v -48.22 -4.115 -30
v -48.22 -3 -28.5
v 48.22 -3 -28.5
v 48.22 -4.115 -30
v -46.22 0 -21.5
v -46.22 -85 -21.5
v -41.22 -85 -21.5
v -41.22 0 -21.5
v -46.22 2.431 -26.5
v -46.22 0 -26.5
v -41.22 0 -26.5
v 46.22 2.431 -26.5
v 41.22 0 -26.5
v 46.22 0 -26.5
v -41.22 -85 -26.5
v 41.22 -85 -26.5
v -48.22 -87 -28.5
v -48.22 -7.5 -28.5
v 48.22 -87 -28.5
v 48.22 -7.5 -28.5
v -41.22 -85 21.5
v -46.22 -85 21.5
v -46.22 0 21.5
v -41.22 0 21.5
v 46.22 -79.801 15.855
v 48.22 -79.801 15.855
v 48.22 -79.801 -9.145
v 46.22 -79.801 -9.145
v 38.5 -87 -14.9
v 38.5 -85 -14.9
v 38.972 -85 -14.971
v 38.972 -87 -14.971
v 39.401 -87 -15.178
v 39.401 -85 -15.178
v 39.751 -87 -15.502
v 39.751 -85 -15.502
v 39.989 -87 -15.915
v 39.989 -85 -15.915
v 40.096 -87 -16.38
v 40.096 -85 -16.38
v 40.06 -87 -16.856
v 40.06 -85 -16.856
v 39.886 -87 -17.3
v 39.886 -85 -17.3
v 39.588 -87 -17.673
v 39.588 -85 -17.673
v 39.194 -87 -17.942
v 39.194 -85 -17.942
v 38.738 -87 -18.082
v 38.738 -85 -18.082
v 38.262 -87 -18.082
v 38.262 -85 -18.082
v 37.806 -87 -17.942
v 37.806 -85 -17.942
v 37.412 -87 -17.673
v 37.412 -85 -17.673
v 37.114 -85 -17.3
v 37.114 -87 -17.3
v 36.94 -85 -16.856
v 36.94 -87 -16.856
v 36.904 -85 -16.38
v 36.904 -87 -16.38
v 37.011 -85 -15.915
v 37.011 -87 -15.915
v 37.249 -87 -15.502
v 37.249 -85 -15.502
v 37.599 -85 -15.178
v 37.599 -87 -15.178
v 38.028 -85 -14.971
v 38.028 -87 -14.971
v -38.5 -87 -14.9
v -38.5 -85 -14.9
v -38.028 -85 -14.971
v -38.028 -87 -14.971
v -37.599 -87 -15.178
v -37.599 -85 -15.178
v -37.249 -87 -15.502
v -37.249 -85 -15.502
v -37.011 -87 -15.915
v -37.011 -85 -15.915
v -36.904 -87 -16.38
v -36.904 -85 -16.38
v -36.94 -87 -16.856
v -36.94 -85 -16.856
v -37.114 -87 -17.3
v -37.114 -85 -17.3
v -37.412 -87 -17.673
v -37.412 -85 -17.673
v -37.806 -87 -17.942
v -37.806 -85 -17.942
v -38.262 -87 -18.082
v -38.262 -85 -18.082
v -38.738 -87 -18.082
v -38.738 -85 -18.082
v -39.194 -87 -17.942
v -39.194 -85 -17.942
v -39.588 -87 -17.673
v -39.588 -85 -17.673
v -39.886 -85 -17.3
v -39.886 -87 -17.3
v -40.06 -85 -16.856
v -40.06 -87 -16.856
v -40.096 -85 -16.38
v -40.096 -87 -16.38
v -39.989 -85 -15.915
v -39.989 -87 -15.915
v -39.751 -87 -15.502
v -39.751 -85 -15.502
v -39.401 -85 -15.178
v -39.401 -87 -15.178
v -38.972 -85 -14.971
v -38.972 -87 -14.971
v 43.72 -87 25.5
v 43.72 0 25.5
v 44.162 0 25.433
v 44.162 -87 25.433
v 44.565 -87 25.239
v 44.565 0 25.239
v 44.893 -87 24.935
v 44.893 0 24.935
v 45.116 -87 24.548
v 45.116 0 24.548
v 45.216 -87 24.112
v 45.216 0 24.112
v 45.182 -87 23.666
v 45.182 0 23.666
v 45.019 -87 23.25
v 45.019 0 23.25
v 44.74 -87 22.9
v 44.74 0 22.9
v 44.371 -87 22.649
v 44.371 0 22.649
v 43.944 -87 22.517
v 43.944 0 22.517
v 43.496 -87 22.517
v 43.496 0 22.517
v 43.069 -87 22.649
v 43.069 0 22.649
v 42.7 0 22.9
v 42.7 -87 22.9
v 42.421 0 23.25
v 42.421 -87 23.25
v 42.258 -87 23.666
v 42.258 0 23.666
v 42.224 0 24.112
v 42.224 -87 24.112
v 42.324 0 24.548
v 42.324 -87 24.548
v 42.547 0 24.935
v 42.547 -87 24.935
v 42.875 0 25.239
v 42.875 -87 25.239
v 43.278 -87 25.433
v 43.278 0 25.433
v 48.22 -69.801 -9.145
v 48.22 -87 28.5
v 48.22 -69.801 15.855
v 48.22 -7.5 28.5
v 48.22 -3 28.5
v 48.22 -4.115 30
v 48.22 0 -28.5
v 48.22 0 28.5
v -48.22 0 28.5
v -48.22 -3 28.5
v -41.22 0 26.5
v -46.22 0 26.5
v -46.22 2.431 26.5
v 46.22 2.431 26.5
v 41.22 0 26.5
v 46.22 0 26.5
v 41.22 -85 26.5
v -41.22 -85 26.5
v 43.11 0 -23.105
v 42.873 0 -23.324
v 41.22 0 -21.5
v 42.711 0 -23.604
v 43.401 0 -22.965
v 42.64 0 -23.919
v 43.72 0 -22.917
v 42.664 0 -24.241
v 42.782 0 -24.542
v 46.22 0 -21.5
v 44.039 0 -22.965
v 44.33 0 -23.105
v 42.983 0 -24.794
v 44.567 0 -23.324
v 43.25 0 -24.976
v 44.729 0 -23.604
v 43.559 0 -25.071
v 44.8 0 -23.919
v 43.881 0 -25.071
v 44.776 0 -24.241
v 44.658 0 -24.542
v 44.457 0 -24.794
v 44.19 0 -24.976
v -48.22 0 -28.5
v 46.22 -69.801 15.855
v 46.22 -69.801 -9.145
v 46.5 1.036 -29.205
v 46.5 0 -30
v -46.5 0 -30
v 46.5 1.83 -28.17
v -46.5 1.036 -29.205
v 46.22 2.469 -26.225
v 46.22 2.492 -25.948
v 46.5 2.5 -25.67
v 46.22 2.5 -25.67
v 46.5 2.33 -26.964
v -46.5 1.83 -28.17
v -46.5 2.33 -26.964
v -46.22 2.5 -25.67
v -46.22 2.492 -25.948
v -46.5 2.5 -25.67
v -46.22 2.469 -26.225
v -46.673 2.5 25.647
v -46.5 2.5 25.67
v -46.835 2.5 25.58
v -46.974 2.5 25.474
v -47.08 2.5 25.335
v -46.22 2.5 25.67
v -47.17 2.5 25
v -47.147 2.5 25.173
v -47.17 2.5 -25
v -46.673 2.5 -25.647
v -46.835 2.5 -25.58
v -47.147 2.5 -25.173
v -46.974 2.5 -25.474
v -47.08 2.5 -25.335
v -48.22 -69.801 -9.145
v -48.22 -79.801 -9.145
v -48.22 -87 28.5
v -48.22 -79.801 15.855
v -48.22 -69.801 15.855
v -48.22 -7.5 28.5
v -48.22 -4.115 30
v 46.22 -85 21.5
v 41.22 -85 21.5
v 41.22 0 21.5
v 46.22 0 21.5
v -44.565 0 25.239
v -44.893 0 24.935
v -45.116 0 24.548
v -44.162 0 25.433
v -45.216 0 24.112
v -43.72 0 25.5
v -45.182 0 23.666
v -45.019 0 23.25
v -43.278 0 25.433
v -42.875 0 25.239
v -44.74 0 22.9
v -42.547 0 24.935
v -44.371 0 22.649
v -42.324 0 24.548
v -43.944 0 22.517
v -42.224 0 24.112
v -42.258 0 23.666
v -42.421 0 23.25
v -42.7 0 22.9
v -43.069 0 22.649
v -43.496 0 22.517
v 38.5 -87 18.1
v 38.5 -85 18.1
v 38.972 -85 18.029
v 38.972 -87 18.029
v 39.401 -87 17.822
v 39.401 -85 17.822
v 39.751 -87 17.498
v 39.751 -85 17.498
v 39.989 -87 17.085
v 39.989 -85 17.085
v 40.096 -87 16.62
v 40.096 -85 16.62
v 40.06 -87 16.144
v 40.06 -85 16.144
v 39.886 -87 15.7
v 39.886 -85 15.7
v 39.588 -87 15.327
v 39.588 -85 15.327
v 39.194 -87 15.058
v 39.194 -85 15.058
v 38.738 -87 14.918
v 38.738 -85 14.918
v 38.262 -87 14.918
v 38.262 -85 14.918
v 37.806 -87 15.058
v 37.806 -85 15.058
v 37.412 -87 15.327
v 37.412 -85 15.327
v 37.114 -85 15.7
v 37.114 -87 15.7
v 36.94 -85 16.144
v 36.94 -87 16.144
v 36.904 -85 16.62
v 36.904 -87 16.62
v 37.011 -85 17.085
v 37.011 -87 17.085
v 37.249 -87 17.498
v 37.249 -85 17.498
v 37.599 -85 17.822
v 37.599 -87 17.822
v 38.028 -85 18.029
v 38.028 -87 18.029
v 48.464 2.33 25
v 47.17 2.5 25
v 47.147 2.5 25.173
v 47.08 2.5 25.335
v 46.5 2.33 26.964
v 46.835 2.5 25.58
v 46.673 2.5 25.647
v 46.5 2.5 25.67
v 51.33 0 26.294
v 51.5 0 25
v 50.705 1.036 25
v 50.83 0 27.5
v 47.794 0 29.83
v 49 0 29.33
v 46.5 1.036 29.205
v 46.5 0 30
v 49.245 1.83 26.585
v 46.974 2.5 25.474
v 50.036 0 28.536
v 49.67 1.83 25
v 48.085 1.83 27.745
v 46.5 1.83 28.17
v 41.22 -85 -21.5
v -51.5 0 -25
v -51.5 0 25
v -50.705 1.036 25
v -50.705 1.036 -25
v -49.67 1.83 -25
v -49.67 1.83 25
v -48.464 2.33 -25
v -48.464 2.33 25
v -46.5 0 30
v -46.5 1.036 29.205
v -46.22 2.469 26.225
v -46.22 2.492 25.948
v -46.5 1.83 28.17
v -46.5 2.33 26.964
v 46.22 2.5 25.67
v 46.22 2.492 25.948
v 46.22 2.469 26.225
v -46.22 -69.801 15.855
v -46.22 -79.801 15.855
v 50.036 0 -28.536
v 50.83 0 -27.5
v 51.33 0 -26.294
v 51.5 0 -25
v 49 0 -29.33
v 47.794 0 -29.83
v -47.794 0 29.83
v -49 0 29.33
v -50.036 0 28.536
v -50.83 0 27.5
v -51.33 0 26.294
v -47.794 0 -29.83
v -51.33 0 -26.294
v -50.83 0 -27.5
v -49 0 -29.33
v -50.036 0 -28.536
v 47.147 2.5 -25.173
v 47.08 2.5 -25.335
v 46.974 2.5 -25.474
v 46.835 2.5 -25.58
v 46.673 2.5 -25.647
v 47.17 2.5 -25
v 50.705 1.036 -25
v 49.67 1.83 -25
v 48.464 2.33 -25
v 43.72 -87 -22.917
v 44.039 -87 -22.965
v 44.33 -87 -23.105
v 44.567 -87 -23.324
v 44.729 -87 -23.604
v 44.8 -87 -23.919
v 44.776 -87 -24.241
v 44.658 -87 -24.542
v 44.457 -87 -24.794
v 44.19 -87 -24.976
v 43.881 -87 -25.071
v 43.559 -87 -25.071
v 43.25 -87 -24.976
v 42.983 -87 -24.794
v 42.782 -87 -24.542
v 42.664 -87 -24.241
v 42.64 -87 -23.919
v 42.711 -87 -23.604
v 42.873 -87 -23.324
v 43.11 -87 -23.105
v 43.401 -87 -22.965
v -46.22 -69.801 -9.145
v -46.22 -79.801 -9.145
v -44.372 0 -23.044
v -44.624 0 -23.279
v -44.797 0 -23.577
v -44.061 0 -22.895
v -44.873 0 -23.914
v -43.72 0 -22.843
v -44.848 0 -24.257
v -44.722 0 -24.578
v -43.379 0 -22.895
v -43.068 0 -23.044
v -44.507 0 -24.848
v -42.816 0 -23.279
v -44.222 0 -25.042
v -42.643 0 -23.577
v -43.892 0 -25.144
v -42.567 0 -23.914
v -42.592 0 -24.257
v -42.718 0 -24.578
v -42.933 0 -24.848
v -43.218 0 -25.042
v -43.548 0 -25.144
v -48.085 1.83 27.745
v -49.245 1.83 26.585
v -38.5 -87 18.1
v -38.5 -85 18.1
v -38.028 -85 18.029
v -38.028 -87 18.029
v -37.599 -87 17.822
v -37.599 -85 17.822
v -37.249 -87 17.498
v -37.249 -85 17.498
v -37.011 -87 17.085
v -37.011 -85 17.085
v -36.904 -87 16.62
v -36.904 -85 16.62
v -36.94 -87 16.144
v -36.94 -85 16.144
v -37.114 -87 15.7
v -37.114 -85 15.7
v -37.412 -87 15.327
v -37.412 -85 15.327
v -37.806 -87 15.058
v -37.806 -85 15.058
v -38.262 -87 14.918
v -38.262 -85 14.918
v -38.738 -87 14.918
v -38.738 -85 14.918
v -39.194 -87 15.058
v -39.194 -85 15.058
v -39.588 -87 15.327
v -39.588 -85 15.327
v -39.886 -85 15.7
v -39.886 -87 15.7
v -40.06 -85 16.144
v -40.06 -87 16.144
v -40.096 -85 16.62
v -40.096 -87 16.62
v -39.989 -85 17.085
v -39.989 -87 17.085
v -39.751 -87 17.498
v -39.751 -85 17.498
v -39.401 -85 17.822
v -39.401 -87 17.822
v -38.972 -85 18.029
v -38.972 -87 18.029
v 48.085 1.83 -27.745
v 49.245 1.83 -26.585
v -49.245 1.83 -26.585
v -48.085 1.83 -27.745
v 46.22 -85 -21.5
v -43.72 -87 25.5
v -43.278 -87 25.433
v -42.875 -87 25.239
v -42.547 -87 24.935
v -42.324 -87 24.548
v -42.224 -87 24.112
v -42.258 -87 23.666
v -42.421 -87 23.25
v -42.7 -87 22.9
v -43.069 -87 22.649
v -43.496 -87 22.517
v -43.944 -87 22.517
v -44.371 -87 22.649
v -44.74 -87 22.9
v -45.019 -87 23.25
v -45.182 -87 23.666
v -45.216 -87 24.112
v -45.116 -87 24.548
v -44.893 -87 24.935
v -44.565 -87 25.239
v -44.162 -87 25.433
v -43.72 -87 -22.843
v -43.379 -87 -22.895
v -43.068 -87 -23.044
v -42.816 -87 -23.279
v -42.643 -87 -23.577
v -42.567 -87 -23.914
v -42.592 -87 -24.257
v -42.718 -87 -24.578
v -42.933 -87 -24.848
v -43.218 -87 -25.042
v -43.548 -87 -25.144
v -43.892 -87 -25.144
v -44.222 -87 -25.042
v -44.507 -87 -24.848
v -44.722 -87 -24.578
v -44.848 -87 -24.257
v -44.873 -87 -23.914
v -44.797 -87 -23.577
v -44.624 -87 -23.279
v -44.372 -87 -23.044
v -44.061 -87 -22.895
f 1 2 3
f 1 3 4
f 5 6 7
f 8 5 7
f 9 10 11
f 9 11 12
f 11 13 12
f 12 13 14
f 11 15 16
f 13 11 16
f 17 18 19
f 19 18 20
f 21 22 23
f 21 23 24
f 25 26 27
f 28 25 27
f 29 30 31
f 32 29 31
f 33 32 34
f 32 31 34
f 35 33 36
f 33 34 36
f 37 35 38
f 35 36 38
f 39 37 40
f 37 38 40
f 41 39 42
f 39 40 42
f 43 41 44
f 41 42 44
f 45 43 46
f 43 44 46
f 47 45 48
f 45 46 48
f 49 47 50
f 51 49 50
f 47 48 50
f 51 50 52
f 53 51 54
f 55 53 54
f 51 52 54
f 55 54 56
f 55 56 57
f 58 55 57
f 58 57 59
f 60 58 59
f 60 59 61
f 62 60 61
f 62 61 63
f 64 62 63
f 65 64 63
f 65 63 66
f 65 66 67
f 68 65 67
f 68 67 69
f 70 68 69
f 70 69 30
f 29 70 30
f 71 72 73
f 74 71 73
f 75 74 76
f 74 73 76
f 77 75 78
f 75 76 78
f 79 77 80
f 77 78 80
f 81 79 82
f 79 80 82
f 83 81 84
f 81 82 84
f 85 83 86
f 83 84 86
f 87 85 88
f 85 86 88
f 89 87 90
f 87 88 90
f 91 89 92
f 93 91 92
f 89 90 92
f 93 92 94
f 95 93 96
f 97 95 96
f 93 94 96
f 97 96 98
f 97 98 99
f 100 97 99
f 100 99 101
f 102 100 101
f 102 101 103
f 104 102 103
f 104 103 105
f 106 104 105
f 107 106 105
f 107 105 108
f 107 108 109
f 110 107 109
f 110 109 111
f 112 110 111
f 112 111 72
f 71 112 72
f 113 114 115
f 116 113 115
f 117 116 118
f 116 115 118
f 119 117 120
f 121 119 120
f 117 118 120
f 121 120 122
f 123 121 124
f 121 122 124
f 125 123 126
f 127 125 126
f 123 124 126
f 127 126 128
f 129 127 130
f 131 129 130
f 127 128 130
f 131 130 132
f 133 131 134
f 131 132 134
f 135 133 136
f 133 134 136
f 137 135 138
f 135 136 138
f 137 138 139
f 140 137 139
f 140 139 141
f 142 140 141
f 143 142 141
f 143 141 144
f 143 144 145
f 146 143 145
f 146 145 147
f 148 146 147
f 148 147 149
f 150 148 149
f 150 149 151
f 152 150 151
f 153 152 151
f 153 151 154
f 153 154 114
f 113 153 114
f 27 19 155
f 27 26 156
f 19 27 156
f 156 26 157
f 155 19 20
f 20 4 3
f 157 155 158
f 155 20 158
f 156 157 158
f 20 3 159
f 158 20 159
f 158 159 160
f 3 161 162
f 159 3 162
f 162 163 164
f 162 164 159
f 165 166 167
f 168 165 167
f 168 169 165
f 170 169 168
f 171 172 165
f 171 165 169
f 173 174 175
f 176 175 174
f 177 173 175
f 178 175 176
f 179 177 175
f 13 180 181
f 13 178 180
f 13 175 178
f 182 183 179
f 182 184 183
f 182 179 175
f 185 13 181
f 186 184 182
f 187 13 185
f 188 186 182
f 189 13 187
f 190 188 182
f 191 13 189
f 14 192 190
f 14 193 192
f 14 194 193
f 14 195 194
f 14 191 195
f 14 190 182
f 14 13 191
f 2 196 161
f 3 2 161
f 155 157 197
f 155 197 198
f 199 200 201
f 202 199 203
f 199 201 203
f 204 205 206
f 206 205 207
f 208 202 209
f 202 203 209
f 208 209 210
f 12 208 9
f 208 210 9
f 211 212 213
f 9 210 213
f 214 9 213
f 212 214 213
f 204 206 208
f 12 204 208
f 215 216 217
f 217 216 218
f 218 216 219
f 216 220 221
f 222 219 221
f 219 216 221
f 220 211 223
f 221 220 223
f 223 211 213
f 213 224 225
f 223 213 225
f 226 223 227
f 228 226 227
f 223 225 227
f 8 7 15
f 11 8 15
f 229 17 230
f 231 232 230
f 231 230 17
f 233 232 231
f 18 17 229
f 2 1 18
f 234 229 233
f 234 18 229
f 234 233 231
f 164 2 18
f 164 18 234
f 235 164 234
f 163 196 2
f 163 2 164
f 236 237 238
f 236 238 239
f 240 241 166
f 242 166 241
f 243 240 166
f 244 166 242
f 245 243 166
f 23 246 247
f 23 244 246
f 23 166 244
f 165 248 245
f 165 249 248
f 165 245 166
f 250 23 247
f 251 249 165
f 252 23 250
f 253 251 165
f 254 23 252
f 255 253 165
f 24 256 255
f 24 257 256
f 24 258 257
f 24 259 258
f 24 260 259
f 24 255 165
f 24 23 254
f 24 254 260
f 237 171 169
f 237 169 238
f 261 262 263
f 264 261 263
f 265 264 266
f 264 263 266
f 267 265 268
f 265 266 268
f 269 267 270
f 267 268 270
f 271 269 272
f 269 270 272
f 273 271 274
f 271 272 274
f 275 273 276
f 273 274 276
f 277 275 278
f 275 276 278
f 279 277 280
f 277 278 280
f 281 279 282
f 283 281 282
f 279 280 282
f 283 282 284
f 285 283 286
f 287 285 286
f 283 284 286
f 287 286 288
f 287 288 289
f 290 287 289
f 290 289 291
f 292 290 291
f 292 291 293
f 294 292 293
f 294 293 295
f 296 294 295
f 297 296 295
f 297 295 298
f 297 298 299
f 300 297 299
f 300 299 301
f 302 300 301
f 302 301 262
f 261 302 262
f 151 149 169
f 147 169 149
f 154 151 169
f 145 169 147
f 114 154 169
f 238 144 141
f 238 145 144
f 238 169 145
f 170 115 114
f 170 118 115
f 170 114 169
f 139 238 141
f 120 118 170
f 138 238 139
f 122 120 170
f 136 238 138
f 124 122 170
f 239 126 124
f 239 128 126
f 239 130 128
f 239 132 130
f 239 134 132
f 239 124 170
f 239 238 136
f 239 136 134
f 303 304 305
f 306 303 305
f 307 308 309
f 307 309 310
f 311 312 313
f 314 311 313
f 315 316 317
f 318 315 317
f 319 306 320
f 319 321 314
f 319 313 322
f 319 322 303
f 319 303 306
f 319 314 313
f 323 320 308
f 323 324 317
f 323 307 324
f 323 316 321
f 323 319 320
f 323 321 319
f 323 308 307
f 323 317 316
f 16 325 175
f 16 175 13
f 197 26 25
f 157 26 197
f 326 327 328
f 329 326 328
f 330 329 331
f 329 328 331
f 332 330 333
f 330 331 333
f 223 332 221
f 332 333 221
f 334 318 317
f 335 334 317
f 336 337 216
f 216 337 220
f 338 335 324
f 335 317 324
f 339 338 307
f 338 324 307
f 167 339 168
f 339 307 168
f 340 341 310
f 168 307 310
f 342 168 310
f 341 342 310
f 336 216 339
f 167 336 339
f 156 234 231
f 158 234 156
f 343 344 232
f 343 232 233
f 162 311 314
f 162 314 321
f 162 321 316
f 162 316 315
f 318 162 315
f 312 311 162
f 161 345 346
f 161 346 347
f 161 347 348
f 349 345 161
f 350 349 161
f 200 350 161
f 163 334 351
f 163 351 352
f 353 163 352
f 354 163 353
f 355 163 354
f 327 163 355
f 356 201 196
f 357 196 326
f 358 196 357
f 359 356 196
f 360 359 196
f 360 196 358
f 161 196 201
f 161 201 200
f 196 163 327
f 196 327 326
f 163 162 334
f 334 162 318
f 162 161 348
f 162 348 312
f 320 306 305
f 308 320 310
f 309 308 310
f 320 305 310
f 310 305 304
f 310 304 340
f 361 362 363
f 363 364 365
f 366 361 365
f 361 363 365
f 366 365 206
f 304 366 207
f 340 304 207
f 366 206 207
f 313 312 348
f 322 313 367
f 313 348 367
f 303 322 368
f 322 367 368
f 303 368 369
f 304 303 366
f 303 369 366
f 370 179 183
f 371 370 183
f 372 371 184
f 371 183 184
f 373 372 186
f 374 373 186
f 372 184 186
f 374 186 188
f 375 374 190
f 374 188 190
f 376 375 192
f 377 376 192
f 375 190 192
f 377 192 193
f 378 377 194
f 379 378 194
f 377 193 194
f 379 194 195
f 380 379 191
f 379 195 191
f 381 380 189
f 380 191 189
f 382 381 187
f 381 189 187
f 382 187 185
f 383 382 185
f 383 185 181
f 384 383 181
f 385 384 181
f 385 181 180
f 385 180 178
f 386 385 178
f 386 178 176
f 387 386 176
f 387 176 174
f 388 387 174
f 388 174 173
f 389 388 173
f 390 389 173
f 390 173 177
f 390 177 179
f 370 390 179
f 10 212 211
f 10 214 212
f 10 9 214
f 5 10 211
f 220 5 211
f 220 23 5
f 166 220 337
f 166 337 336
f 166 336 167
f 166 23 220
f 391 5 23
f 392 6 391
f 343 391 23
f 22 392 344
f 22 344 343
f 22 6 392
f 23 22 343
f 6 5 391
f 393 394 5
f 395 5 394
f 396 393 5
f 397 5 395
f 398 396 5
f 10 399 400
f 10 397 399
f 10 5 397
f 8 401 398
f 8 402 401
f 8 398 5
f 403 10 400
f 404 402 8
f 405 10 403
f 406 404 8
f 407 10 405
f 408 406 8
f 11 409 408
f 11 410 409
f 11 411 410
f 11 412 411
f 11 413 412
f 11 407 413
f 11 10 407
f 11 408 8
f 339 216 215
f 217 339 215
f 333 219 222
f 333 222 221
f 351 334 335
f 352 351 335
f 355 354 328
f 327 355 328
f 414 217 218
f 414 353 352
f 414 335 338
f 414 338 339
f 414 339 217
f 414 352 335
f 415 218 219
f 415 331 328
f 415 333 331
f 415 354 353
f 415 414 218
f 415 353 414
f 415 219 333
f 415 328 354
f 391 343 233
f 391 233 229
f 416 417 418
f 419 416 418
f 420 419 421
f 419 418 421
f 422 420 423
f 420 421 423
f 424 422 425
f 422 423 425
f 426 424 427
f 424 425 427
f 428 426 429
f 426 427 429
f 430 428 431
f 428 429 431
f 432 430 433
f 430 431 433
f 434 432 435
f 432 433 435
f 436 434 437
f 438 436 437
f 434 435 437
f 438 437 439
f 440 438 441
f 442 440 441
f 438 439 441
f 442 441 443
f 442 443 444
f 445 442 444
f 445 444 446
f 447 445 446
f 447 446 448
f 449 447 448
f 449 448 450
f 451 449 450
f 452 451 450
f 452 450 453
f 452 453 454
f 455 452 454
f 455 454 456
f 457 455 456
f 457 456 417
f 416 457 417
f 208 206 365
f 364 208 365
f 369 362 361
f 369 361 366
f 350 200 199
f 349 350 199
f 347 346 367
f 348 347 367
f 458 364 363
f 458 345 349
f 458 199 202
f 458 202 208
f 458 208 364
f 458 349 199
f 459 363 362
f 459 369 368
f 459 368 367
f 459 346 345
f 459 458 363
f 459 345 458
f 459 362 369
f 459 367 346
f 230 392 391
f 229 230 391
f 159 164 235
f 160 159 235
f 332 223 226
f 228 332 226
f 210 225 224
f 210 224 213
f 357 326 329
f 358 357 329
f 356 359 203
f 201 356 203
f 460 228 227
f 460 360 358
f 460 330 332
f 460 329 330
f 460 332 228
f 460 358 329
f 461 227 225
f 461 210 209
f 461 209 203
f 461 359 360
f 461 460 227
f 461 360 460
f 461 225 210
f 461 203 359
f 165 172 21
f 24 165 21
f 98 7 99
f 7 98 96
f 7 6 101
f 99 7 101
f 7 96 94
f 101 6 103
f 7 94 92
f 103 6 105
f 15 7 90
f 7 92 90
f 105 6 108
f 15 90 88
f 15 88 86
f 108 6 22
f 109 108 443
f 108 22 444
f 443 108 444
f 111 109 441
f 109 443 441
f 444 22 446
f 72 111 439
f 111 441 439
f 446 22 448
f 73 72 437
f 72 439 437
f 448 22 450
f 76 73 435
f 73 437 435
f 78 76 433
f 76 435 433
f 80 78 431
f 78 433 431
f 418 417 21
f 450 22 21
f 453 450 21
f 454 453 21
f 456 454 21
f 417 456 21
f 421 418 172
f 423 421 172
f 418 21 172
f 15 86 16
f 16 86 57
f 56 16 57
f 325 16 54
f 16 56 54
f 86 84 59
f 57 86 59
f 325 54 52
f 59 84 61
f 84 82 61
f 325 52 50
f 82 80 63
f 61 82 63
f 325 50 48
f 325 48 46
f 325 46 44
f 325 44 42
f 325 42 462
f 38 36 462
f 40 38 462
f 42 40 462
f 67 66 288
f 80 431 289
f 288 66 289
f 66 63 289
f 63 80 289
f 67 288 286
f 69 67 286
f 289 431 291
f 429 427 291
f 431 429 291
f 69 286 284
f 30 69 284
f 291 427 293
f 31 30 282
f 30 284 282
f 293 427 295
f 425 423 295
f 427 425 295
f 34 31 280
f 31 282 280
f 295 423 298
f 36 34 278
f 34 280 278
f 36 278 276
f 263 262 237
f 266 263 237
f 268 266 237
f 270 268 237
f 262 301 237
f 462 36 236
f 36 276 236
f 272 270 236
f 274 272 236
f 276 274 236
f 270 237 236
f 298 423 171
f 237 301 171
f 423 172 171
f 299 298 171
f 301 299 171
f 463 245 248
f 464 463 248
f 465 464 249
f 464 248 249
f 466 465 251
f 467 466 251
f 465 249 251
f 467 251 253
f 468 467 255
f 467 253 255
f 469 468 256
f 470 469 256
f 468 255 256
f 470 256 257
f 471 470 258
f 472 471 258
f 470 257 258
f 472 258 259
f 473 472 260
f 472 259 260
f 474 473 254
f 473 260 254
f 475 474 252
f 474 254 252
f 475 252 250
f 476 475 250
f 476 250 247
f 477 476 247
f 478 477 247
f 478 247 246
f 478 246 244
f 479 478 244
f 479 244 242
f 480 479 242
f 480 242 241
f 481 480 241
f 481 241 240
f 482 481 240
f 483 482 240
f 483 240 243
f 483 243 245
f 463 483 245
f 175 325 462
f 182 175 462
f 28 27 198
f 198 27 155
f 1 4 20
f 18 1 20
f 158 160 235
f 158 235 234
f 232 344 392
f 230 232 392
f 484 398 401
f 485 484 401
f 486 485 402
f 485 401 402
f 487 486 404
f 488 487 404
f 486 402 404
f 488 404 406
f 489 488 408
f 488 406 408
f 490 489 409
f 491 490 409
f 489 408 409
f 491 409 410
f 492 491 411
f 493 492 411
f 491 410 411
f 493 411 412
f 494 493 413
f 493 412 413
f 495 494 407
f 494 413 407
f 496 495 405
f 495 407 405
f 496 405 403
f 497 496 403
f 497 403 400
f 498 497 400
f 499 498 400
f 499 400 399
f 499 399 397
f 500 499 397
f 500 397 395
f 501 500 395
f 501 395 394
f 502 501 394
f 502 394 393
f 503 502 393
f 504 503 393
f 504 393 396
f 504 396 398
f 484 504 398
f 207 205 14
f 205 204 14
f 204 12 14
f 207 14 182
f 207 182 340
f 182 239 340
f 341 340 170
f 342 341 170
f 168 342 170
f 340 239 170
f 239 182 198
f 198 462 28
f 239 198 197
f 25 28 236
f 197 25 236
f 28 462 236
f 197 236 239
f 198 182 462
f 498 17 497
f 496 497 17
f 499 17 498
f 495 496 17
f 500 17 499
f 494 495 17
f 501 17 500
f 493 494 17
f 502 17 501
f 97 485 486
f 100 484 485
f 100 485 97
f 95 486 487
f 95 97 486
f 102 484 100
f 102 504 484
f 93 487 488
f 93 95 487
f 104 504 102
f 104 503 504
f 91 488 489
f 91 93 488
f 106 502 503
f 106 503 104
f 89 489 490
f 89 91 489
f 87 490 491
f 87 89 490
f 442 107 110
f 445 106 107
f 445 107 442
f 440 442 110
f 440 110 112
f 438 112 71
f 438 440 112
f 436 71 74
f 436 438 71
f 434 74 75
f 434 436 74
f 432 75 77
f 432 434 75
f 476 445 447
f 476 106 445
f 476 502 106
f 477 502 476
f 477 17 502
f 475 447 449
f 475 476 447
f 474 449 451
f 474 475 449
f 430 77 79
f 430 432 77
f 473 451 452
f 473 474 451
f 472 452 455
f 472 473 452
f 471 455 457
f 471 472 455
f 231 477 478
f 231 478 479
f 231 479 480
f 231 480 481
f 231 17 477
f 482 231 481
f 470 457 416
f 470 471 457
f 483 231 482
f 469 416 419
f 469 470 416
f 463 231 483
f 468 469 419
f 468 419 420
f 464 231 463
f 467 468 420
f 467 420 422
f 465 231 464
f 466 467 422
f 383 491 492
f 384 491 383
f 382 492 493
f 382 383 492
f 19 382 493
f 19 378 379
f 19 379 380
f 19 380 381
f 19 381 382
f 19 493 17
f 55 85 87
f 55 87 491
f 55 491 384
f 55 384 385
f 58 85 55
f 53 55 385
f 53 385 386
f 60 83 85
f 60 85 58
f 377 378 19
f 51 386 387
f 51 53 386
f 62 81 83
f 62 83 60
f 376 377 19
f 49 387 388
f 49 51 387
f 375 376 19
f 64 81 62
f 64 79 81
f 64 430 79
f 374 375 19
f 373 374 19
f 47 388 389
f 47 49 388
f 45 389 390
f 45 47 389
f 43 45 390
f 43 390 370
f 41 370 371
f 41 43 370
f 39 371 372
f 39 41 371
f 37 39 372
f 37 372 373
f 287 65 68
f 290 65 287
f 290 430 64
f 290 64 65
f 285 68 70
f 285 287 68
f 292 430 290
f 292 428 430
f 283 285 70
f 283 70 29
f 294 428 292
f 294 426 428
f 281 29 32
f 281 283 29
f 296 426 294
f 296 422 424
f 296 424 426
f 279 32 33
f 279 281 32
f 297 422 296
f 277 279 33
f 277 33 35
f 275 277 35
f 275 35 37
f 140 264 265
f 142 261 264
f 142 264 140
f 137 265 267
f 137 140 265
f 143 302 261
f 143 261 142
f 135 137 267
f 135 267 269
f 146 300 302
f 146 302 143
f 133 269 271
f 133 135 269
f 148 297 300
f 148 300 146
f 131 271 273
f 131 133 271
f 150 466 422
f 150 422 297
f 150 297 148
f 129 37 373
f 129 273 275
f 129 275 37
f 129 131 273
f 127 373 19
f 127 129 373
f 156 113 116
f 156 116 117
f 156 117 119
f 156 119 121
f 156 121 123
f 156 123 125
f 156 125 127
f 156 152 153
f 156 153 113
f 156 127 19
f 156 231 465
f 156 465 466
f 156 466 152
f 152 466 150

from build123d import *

# Parameters (mm, degrees)
BOSS_EXTRUDE1_DEPTH = 2.5
FILLET1_R           = 5
SKETCH2_W           = 96.44
SKETCH2_H           = 57
SKETCH2_W_2         = 92.44
SKETCH2_H_2         = 53
BOSS_EXTRUDE2_DEPTH = 85
SKETCH4_W           = 92.44
SKETCH4_H           = 53
CUT_EXTRUDE1_DEPTH  = 104.813534763
SKETCH3_W           = 96.44
SKETCH3_H           = 57
BOSS_EXTRUDE3_DEPTH = 2
BOSS_EXTRUDE4_DEPTH = 96.44
SKETCH6_W           = 5
SKETCH6_H           = 5
BOSS_EXTRUDE5_DEPTH = 85
SKETCH7_R           = 1.6
CUT_EXTRUDE2_DEPTH  = 106.870203551
SKETCH8_W           = 25
SKETCH8_H           = 10
CUT_EXTRUDE3_DEPTH  = 136.694798721
SKETCH9_R           = 1.5
SKETCH9_R_2         = 1.08347565
SKETCH9_R_3         = 1.156670199
CUT_EXTRUDE4_DEPTH  = 106.457337345


with BuildPart() as part:
    # Sketch1 → Boss-Extrude1 (new body)
    with BuildSketch(Plane(origin=(0, 0, 0), x_dir=(1, 0, 0), z_dir=(0, 1, 0))):
        with BuildLine():
            Line((-46.5, 30), (46.5, 30))
            ThreePointArc((46.5, 30), (50.035533906, 28.535533906), (51.5, 25))
            Line((51.5, 25), (51.5, -25))
            ThreePointArc((51.5, -25), (50.035533906, -28.535533906), (46.5, -30))
            Line((46.5, -30), (-46.5, -30))
            ThreePointArc((-46.5, -30), (-50.035533906, -28.535533906), (-51.5, -25))
            Line((-51.5, -25), (-51.5, 25))
            ThreePointArc((-51.5, 25), (-50.035533906, 28.535533906), (-46.5, 30))
        make_face()
    extrude(amount=BOSS_EXTRUDE1_DEPTH)

    # Fillet1
    # the kernel refuses this fillet: 5 mm, written as the material it takes off along each edge
    with BuildSketch(Plane(origin=(-46.5, 2.5, -25), x_dir=(-1, 0, 0), z_dir=(0, 0, 1))) as fillet1_piece_1:
        with BuildLine():
            CenterArc((0.669872981, 5), FILLET1_R, 270, 60)
            Line((0.669872981, 0), (0.669872981, -0.1))
            Line((0.669872981, -0.1), (5, -0.1))
            Line((5, -0.1), (5.1, 0))
            ThreePointArc((5.1, 0), (5.1, 1.25), (5.08660254, 2.45))
            Line((5.08660254, 2.45), (5, 2.5))
        make_face()
    revolve(axis=Axis((-46.5, 2.5, -25), (0, -1, 0)), revolution_arc=90, mode=Mode.SUBTRACT)
    with BuildSketch(Plane(origin=(-46.5, 2.5, -30), x_dir=(0, -1, 0), z_dir=(1, 0, 0)), Plane(origin=(46.5, 2.5, 30), x_dir=(0, -1, 0), z_dir=(-1, 0, 0))) as fillet1_piece_2:
        with BuildLine():
            CenterArc((5, -4.330127019), FILLET1_R, 120, 60)
            Line((0, -4.330127019), (-0.1, -4.330127019))
            Line((-0.1, -4.330127019), (-0.1, 0))
            Line((-0.1, 0), (0, 0.1))
            ThreePointArc((0, 0.1), (1.25, 0.1), (2.45, 0.08660254))
            Line((2.45, 0.08660254), (2.5, 0))
        make_face()
    extrude(amount=93, mode=Mode.SUBTRACT)
    with BuildSketch(Plane(origin=(46.5, 2.5, -25), x_dir=(0, 0, -1), z_dir=(-1, 0, 0))) as fillet1_piece_3:
        with BuildLine():
            CenterArc((0.669872981, 5), FILLET1_R, 270, 60)
            Line((0.669872981, 0), (0.669872981, -0.1))
            Line((0.669872981, -0.1), (5, -0.1))
            Line((5, -0.1), (5.1, 0))
            ThreePointArc((5.1, 0), (5.1, 1.25), (5.08660254, 2.45))
            Line((5.08660254, 2.45), (5, 2.5))
        make_face()
    revolve(axis=Axis((46.5, 2.5, -25), (0, -1, 0)), revolution_arc=90, mode=Mode.SUBTRACT)
    with BuildSketch(Plane(origin=(51.5, 2.5, -25), x_dir=(0, -1, 0), z_dir=(0, 0, 1)), Plane(origin=(-51.5, 2.5, 25), x_dir=(0, -1, 0), z_dir=(0, 0, -1))) as fillet1_piece_4:
        with BuildLine():
            CenterArc((5, -4.330127019), FILLET1_R, 120, 60)
            Line((0, -4.330127019), (-0.1, -4.330127019))
            Line((-0.1, -4.330127019), (-0.1, 0))
            Line((-0.1, 0), (0, 0.1))
            ThreePointArc((0, 0.1), (1.25, 0.1), (2.45, 0.08660254))
            Line((2.45, 0.08660254), (2.5, 0))
        make_face()
    extrude(amount=50, mode=Mode.SUBTRACT)
    with BuildSketch(Plane(origin=(46.5, 2.5, 25), x_dir=(1, 0, 0), z_dir=(0, 0, -1))) as fillet1_piece_5:
        with BuildLine():
            CenterArc((0.669872981, 5), FILLET1_R, 270, 60)
            Line((0.669872981, 0), (0.669872981, -0.1))
            Line((0.669872981, -0.1), (5, -0.1))
            Line((5, -0.1), (5.1, 0))
            ThreePointArc((5.1, 0), (5.1, 1.25), (5.08660254, 2.45))
            Line((5.08660254, 2.45), (5, 2.5))
        make_face()
    revolve(axis=Axis((46.5, 2.5, 25), (0, -1, 0)), revolution_arc=90, mode=Mode.SUBTRACT)
    with BuildSketch(Plane(origin=(-46.5, 2.5, 25), x_dir=(0, 0, 1), z_dir=(1, 0, 0))) as fillet1_piece_6:
        with BuildLine():
            CenterArc((0.669872981, 5), FILLET1_R, 270, 60)
            Line((0.669872981, 0), (0.669872981, -0.1))
            Line((0.669872981, -0.1), (5, -0.1))
            Line((5, -0.1), (5.1, 0))
            ThreePointArc((5.1, 0), (5.1, 1.25), (5.08660254, 2.45))
            Line((5.08660254, 2.45), (5, 2.5))
        make_face()
    revolve(axis=Axis((-46.5, 2.5, 25), (0, -1, 0)), revolution_arc=90, mode=Mode.SUBTRACT)

    # Sketch2 → Boss-Extrude2 (add)
    with BuildSketch(Plane.XZ):
        Rectangle(SKETCH2_W, SKETCH2_H)
        Rectangle(SKETCH2_W_2, SKETCH2_H_2, mode=Mode.SUBTRACT)
    extrude(amount=BOSS_EXTRUDE2_DEPTH)

    # Sketch4 → Cut-Extrude1 (cut, through all)
    with BuildSketch(Plane.XZ):
        Rectangle(SKETCH4_W, SKETCH4_H)
    extrude(amount=-CUT_EXTRUDE1_DEPTH, mode=Mode.SUBTRACT)

    # Sketch3 → Boss-Extrude3 (add)
    with BuildSketch(Plane.XZ.offset(85)):
        Rectangle(SKETCH3_W, SKETCH3_H)
    extrude(amount=BOSS_EXTRUDE3_DEPTH)

    # Sketch5 → Boss-Extrude4 (add)
    with BuildSketch(Plane.ZY.offset(48.22)):
        Polygon((-28.5, -7.5), (-28.5, -3), (-30, -4.114730389), align=None)
    boss_extrude4 = extrude(amount=-BOSS_EXTRUDE4_DEPTH)

    # Mirror1: Boss-Extrude4 across plane
    add(boss_extrude4.mirror(Plane.XY))

    # Sketch6 → Boss-Extrude5 (add)
    with BuildSketch(Plane(origin=(0, -85, 0), x_dir=(1, 0, 0), z_dir=(0, 1, 0))):
        with Locations((43.72, 24)):
            Rectangle(SKETCH6_W, SKETCH6_H)
        with Locations((-43.72, 24)):
            Rectangle(SKETCH6_W, SKETCH6_H)
        with Locations((43.72, -24)):
            Rectangle(SKETCH6_W, SKETCH6_H)
        with Locations((-43.72, -24)):
            Rectangle(SKETCH6_W, SKETCH6_H)
    extrude(amount=BOSS_EXTRUDE5_DEPTH)

    # Sketch7 → Cut-Extrude2 (cut, through all)
    with BuildSketch(Plane(origin=(0, -85, 0), x_dir=(1, 0, 0), z_dir=(0, 1, 0))):
        with Locations(Location((-38.5, 16.5, 0), (0, 0, 270))):
            Circle(SKETCH7_R)
        with Locations(Location((38.5, 16.5, 0), (0, 0, 270))):
            Circle(SKETCH7_R)
        with Locations(Location((-38.5, -16.5, 0), (0, 0, 270))):
            Circle(SKETCH7_R)
        with Locations(Location((38.5, -16.5, 0), (0, 0, 270))):
            Circle(SKETCH7_R)
    extrude(amount=-CUT_EXTRUDE2_DEPTH, mode=Mode.SUBTRACT)

    # Sketch8 → Cut-Extrude3 (cut, through all)
    with BuildSketch(Plane(origin=(48.22, 0, 0), x_dir=(0, 0, -1), z_dir=(1, 0, 0))):
        with Locations((-3.355310765, -74.801411427)):
            Rectangle(SKETCH8_W, SKETCH8_H)
    extrude(amount=-CUT_EXTRUDE3_DEPTH, mode=Mode.SUBTRACT)

    # Sketch9 → Cut-Extrude4 (cut, through all)
    with BuildSketch(Plane(origin=(0, 0, 0), x_dir=(1, 0, 0), z_dir=(0, 1, 0))):
        with Locations(Location((-43.72, -24, 0), (0, 0, 270))):
            Circle(SKETCH9_R)
        with Locations(Location((43.72, -24, 0), (0, 0, 270))):
            Circle(SKETCH9_R)
        with Locations(Location((43.72, 24, 0), (0, 0, 270))):
            Circle(SKETCH9_R_2)
        with Locations(Location((-43.72, 24, 0), (0, 0, 270))):
            Circle(SKETCH9_R_3)
    extrude(amount=-CUT_EXTRUDE4_DEPTH, mode=Mode.SUBTRACT)


solid = part.part
